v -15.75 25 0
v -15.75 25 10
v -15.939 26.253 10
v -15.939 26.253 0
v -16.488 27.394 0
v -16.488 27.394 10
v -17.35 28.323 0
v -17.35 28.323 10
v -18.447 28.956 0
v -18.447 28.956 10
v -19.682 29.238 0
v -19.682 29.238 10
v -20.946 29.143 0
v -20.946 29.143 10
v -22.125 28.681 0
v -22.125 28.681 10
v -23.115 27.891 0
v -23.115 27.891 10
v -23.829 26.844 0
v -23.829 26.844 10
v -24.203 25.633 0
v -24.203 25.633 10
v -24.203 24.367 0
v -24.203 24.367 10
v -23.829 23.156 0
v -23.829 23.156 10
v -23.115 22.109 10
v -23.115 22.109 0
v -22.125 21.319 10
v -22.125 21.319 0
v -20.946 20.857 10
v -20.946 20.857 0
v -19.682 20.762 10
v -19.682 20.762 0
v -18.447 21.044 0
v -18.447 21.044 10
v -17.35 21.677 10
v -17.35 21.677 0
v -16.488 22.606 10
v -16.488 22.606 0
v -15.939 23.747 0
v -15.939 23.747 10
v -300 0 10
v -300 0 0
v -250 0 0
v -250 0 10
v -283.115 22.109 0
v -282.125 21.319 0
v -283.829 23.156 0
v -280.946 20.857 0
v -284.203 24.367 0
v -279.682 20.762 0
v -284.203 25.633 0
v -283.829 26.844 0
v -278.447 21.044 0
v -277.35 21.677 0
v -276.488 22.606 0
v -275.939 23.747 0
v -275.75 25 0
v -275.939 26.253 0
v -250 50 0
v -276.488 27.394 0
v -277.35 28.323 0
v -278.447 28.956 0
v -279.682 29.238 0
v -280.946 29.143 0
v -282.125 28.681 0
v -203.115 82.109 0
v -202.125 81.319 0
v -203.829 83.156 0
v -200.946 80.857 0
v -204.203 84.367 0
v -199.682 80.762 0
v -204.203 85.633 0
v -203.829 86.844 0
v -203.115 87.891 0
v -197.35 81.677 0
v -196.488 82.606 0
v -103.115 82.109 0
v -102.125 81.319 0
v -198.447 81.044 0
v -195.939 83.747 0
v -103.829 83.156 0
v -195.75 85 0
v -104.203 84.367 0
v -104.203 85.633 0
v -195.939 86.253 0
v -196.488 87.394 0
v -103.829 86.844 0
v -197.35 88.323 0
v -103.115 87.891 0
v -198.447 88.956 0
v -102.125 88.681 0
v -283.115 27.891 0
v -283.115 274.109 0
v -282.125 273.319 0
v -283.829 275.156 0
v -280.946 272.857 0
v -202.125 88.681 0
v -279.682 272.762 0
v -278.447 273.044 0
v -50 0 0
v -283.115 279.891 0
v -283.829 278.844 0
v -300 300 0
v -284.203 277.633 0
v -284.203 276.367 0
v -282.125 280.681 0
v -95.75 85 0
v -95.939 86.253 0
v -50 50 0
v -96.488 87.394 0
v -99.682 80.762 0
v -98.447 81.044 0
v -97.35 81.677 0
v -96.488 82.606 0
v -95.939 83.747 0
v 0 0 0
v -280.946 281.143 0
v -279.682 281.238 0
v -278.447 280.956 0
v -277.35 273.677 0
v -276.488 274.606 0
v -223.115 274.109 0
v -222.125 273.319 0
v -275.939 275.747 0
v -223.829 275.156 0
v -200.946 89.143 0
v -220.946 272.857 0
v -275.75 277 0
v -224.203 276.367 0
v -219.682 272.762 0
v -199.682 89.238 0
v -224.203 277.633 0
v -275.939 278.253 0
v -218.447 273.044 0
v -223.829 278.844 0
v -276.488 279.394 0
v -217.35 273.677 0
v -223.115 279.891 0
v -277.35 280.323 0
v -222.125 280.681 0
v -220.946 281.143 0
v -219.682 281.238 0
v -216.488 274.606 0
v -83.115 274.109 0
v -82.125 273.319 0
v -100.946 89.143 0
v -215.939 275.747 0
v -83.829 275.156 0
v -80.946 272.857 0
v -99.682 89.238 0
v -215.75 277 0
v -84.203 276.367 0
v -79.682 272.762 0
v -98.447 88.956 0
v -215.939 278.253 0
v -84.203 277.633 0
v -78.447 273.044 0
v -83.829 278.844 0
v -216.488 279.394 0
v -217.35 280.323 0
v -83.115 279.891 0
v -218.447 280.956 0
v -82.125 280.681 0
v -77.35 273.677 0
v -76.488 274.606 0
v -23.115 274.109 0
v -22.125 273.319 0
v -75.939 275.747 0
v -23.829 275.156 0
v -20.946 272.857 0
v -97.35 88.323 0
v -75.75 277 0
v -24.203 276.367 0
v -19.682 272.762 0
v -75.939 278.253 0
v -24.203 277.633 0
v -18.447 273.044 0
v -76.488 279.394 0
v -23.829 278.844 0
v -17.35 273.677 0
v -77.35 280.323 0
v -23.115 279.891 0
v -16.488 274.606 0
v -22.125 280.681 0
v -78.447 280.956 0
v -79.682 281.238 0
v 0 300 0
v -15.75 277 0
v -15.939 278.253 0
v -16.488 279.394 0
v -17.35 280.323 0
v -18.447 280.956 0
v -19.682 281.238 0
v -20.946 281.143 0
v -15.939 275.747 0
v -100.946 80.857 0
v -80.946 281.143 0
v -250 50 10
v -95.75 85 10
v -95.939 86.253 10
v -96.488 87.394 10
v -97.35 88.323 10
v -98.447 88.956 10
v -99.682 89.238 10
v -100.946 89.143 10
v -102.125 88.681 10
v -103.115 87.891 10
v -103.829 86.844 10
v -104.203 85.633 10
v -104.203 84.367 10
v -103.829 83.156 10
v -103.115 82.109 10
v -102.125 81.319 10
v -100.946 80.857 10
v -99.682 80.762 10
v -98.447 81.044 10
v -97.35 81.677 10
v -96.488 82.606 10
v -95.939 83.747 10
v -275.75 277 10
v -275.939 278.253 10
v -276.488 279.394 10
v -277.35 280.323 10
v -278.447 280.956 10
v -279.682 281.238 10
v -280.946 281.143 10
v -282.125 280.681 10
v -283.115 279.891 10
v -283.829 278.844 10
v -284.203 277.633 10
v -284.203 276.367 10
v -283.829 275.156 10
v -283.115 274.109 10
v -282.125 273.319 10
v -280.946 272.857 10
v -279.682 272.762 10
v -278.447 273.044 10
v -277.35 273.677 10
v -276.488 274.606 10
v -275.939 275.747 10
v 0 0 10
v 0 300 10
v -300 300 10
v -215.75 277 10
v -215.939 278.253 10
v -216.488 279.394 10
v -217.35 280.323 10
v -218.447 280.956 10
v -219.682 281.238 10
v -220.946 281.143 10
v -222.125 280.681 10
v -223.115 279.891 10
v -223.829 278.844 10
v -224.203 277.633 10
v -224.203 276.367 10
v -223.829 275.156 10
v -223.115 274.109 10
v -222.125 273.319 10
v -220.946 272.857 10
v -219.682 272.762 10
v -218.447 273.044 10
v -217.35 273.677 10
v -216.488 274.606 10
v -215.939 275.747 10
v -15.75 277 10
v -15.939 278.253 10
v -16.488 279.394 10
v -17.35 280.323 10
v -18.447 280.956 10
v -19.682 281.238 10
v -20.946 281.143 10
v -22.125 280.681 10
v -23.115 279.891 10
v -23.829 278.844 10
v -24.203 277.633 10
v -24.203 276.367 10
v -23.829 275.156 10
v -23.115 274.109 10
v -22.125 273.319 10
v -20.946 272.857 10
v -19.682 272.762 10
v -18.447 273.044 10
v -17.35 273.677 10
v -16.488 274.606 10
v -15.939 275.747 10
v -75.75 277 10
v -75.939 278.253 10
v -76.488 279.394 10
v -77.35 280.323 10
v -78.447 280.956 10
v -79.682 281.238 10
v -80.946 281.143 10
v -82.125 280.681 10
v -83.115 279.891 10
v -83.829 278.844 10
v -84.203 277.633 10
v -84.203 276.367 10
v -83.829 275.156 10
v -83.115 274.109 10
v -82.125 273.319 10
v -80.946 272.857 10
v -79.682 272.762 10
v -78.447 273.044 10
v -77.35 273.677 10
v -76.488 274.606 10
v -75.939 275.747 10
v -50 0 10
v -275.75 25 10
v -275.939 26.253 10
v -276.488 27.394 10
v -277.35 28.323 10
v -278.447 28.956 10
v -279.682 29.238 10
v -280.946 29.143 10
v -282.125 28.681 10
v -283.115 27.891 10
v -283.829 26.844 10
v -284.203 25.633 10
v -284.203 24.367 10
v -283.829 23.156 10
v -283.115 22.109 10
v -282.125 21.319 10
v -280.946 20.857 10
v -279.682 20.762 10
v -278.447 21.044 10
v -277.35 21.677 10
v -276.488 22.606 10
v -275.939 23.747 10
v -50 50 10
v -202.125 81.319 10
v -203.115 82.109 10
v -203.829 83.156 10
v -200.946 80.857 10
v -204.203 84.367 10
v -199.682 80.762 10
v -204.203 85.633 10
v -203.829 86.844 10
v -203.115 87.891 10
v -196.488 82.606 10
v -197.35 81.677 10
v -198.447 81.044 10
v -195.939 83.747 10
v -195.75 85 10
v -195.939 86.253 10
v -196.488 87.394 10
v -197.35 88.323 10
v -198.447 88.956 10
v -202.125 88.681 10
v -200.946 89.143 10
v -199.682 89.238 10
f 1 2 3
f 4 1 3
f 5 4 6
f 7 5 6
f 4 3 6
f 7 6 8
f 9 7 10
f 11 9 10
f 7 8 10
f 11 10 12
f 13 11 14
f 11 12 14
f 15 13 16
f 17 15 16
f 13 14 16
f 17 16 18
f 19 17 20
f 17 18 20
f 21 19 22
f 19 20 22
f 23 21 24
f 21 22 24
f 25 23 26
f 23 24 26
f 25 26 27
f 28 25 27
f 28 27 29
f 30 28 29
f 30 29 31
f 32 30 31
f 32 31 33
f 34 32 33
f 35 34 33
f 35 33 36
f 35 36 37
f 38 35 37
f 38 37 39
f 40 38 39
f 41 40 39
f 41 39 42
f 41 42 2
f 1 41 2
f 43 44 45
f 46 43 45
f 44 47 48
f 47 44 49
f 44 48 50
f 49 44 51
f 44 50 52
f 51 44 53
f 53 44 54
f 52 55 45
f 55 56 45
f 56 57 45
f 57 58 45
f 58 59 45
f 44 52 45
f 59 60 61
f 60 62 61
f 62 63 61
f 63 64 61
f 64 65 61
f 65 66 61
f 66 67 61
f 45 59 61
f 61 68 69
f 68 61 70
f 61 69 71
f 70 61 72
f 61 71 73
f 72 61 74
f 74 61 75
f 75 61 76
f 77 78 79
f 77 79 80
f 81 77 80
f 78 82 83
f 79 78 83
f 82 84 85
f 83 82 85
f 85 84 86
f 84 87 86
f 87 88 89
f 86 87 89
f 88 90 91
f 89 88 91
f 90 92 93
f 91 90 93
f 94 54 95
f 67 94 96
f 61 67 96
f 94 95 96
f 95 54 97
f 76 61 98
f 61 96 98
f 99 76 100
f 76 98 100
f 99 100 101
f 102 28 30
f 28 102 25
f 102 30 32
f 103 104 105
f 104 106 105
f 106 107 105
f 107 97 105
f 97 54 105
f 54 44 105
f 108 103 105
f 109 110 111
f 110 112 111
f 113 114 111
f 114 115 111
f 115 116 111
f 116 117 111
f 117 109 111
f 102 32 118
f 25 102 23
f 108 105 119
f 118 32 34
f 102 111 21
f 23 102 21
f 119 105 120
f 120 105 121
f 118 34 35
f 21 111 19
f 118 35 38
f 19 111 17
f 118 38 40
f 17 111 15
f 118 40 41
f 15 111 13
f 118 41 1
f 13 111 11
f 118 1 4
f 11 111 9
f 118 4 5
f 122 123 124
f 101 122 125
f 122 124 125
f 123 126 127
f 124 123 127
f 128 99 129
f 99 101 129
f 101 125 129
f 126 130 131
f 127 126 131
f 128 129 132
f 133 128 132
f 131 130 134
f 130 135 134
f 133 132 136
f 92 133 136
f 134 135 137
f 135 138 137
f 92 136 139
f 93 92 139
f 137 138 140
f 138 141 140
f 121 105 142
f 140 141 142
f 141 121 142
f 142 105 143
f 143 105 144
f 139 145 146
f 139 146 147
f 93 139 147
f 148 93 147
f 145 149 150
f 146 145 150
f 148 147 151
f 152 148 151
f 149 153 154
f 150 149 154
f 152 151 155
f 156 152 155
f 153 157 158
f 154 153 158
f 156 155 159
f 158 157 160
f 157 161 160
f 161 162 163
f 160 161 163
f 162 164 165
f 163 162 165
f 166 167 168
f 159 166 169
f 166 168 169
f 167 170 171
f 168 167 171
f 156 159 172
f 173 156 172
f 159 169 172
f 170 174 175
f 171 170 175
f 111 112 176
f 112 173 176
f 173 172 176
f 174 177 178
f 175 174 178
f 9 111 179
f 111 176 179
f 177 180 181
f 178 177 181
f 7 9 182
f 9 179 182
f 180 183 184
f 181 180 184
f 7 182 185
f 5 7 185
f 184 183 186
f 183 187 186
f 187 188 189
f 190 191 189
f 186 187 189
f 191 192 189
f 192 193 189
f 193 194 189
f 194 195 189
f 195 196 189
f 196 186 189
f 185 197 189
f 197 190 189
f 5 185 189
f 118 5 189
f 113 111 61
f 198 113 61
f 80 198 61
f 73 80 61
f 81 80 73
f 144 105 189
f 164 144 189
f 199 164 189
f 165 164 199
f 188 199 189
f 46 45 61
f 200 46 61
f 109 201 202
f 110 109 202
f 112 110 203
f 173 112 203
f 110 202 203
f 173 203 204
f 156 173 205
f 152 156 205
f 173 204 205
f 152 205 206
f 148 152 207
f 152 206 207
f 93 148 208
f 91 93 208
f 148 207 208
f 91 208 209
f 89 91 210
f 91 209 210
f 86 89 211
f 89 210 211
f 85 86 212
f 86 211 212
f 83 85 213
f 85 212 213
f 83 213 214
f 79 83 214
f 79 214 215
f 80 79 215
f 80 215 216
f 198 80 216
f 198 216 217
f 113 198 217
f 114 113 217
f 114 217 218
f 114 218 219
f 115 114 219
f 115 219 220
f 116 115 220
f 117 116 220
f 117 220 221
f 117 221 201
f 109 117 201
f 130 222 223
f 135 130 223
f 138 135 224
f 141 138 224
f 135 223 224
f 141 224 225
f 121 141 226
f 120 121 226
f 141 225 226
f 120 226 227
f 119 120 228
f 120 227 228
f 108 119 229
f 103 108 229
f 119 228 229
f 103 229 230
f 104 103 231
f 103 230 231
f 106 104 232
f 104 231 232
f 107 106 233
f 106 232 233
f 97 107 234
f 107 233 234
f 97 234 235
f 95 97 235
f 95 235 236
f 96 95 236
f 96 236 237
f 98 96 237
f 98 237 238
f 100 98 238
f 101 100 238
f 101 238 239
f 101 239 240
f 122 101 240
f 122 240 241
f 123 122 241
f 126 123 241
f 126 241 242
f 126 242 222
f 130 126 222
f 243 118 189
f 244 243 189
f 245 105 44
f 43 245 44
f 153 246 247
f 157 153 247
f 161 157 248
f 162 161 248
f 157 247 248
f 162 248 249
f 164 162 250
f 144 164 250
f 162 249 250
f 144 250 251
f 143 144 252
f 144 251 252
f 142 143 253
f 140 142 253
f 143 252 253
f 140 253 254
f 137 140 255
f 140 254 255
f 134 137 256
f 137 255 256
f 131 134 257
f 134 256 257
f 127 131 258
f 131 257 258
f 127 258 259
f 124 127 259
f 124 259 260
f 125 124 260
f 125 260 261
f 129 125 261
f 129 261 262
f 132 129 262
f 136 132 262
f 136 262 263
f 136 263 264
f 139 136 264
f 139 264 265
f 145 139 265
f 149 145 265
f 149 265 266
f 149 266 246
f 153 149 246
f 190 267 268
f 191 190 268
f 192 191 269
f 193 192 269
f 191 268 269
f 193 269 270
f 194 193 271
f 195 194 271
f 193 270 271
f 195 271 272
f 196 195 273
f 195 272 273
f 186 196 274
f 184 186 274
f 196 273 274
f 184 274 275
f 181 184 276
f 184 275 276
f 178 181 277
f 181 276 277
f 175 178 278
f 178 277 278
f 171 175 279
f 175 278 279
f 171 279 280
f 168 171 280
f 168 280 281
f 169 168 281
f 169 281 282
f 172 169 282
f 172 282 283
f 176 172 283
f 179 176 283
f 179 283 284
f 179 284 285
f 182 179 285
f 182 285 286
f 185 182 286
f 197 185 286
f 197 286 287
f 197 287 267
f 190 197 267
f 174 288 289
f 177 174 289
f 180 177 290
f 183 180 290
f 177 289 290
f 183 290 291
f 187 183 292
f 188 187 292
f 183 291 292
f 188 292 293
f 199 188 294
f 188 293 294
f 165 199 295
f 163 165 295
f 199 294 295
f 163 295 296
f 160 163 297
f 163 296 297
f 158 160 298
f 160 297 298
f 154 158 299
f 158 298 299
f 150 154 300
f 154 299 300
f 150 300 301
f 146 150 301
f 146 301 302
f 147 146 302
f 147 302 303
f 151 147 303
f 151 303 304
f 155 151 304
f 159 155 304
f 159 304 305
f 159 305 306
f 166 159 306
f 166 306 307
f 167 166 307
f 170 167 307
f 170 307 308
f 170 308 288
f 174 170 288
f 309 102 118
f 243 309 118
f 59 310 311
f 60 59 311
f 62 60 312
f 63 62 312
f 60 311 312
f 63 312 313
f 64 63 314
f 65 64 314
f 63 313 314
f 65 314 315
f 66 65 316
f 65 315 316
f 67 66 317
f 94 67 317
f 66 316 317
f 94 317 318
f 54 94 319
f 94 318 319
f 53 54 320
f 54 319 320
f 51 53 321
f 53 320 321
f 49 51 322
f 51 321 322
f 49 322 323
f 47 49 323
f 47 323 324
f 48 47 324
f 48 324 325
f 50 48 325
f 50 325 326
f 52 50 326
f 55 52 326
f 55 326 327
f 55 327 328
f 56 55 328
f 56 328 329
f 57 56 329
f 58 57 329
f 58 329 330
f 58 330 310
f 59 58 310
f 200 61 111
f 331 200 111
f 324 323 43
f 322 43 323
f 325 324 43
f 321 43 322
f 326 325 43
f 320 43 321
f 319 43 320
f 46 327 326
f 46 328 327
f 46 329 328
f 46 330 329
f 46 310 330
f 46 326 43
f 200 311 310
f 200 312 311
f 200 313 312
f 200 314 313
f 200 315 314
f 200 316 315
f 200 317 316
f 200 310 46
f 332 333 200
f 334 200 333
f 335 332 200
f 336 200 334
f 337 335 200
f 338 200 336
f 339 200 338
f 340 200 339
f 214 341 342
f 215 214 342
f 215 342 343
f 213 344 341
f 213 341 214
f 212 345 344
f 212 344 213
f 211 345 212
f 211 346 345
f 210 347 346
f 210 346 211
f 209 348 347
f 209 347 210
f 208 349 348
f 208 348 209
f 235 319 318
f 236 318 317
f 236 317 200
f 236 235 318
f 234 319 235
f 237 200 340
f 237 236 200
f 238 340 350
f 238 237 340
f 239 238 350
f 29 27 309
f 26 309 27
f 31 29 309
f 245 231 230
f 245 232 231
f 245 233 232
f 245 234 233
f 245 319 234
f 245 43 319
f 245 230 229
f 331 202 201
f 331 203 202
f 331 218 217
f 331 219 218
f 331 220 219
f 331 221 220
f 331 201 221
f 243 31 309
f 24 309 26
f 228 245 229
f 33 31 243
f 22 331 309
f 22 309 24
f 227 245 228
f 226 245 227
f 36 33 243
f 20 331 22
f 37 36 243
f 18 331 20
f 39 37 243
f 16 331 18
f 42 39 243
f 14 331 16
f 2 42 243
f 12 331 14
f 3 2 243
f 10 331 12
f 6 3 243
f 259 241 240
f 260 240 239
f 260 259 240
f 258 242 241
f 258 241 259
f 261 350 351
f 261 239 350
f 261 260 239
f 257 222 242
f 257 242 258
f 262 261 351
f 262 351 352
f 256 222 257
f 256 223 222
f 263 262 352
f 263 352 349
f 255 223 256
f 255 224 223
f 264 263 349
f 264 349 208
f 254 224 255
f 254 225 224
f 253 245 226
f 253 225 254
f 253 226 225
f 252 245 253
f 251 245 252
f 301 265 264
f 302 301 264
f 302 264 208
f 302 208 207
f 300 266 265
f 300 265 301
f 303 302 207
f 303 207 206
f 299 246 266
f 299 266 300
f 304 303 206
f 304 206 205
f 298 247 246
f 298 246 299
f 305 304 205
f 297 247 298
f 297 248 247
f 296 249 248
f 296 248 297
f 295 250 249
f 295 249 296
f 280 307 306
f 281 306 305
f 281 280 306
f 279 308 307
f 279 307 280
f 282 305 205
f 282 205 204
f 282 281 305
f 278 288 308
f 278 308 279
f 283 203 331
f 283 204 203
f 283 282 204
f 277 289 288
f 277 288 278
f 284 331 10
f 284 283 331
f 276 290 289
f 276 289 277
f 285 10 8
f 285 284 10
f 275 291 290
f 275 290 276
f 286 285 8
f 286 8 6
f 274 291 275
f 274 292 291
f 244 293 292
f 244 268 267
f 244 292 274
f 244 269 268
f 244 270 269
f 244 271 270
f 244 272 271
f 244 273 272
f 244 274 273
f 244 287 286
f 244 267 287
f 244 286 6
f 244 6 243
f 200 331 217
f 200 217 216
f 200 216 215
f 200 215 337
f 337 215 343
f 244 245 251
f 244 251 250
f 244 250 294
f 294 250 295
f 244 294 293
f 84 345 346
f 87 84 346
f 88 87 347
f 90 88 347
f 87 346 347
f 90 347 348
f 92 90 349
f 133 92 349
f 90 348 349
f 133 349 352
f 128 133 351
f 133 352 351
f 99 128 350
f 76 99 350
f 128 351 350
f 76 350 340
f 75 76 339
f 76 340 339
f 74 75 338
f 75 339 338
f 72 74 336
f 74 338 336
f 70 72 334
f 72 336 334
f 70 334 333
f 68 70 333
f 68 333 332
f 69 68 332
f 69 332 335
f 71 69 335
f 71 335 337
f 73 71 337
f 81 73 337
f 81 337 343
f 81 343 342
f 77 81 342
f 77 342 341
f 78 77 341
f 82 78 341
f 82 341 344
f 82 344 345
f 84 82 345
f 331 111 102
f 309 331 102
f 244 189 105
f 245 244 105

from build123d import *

# Parameters (mm, degrees)
SALIENTE_EXTRUIR1_DEPTH = 10
CROQUIS2_R              = 4.25
CORTAR_EXTRUIR1_DEPTH   = 11
CROQUIS3_R              = 4.25
CORTAR_EXTRUIR2_DEPTH   = 11


with BuildPart() as part:
    # Croquis1 → Saliente-Extruir1 (new body)
    with BuildSketch(Plane.XY):
        Polygon((-300, 0), (-250, 0), (-250, 50), (-50, 50), (-50, 0), (0, 0), (0, 300), (-300, 300), align=None)
    extrude(amount=SALIENTE_EXTRUIR1_DEPTH)

    # Croquis2 → Cortar-Extruir1 (cut, through all)
    with BuildSketch(Plane.XY.offset(10)):
        with Locations((-280, 25)):
            Circle(CROQUIS2_R)
        with Locations((-280, 277)):
            Circle(CROQUIS2_R)
        with Locations((-80, 277)):
            Circle(CROQUIS2_R)
        with Locations((-220, 277)):
            Circle(CROQUIS2_R)
        with Locations((-20, 277)):
            Circle(CROQUIS2_R)
        with Locations((-20, 25)):
            Circle(CROQUIS2_R)
        with Locations((120, 277)):
            Circle(CROQUIS2_R)
        with Locations((-420, 277)):
            Circle(CROQUIS2_R)
    extrude(amount=-CORTAR_EXTRUIR1_DEPTH, mode=Mode.SUBTRACT)

    # Croquis3 → Cortar-Extruir2 (cut, through all)
    with BuildSketch(Plane.XY.offset(10)):
        with Locations((-100, 85)):
            Circle(CROQUIS3_R)
        with Locations((-350, 85)):
            Circle(CROQUIS3_R)
        with Locations((-475, 85)):
            Circle(CROQUIS3_R)
        with Locations((50, 85)):
            Circle(CROQUIS3_R)
        with Locations((-200, 85)):
            Circle(CROQUIS3_R)
    extrude(amount=-CORTAR_EXTRUIR2_DEPTH, mode=Mode.SUBTRACT)


solid = part.part
